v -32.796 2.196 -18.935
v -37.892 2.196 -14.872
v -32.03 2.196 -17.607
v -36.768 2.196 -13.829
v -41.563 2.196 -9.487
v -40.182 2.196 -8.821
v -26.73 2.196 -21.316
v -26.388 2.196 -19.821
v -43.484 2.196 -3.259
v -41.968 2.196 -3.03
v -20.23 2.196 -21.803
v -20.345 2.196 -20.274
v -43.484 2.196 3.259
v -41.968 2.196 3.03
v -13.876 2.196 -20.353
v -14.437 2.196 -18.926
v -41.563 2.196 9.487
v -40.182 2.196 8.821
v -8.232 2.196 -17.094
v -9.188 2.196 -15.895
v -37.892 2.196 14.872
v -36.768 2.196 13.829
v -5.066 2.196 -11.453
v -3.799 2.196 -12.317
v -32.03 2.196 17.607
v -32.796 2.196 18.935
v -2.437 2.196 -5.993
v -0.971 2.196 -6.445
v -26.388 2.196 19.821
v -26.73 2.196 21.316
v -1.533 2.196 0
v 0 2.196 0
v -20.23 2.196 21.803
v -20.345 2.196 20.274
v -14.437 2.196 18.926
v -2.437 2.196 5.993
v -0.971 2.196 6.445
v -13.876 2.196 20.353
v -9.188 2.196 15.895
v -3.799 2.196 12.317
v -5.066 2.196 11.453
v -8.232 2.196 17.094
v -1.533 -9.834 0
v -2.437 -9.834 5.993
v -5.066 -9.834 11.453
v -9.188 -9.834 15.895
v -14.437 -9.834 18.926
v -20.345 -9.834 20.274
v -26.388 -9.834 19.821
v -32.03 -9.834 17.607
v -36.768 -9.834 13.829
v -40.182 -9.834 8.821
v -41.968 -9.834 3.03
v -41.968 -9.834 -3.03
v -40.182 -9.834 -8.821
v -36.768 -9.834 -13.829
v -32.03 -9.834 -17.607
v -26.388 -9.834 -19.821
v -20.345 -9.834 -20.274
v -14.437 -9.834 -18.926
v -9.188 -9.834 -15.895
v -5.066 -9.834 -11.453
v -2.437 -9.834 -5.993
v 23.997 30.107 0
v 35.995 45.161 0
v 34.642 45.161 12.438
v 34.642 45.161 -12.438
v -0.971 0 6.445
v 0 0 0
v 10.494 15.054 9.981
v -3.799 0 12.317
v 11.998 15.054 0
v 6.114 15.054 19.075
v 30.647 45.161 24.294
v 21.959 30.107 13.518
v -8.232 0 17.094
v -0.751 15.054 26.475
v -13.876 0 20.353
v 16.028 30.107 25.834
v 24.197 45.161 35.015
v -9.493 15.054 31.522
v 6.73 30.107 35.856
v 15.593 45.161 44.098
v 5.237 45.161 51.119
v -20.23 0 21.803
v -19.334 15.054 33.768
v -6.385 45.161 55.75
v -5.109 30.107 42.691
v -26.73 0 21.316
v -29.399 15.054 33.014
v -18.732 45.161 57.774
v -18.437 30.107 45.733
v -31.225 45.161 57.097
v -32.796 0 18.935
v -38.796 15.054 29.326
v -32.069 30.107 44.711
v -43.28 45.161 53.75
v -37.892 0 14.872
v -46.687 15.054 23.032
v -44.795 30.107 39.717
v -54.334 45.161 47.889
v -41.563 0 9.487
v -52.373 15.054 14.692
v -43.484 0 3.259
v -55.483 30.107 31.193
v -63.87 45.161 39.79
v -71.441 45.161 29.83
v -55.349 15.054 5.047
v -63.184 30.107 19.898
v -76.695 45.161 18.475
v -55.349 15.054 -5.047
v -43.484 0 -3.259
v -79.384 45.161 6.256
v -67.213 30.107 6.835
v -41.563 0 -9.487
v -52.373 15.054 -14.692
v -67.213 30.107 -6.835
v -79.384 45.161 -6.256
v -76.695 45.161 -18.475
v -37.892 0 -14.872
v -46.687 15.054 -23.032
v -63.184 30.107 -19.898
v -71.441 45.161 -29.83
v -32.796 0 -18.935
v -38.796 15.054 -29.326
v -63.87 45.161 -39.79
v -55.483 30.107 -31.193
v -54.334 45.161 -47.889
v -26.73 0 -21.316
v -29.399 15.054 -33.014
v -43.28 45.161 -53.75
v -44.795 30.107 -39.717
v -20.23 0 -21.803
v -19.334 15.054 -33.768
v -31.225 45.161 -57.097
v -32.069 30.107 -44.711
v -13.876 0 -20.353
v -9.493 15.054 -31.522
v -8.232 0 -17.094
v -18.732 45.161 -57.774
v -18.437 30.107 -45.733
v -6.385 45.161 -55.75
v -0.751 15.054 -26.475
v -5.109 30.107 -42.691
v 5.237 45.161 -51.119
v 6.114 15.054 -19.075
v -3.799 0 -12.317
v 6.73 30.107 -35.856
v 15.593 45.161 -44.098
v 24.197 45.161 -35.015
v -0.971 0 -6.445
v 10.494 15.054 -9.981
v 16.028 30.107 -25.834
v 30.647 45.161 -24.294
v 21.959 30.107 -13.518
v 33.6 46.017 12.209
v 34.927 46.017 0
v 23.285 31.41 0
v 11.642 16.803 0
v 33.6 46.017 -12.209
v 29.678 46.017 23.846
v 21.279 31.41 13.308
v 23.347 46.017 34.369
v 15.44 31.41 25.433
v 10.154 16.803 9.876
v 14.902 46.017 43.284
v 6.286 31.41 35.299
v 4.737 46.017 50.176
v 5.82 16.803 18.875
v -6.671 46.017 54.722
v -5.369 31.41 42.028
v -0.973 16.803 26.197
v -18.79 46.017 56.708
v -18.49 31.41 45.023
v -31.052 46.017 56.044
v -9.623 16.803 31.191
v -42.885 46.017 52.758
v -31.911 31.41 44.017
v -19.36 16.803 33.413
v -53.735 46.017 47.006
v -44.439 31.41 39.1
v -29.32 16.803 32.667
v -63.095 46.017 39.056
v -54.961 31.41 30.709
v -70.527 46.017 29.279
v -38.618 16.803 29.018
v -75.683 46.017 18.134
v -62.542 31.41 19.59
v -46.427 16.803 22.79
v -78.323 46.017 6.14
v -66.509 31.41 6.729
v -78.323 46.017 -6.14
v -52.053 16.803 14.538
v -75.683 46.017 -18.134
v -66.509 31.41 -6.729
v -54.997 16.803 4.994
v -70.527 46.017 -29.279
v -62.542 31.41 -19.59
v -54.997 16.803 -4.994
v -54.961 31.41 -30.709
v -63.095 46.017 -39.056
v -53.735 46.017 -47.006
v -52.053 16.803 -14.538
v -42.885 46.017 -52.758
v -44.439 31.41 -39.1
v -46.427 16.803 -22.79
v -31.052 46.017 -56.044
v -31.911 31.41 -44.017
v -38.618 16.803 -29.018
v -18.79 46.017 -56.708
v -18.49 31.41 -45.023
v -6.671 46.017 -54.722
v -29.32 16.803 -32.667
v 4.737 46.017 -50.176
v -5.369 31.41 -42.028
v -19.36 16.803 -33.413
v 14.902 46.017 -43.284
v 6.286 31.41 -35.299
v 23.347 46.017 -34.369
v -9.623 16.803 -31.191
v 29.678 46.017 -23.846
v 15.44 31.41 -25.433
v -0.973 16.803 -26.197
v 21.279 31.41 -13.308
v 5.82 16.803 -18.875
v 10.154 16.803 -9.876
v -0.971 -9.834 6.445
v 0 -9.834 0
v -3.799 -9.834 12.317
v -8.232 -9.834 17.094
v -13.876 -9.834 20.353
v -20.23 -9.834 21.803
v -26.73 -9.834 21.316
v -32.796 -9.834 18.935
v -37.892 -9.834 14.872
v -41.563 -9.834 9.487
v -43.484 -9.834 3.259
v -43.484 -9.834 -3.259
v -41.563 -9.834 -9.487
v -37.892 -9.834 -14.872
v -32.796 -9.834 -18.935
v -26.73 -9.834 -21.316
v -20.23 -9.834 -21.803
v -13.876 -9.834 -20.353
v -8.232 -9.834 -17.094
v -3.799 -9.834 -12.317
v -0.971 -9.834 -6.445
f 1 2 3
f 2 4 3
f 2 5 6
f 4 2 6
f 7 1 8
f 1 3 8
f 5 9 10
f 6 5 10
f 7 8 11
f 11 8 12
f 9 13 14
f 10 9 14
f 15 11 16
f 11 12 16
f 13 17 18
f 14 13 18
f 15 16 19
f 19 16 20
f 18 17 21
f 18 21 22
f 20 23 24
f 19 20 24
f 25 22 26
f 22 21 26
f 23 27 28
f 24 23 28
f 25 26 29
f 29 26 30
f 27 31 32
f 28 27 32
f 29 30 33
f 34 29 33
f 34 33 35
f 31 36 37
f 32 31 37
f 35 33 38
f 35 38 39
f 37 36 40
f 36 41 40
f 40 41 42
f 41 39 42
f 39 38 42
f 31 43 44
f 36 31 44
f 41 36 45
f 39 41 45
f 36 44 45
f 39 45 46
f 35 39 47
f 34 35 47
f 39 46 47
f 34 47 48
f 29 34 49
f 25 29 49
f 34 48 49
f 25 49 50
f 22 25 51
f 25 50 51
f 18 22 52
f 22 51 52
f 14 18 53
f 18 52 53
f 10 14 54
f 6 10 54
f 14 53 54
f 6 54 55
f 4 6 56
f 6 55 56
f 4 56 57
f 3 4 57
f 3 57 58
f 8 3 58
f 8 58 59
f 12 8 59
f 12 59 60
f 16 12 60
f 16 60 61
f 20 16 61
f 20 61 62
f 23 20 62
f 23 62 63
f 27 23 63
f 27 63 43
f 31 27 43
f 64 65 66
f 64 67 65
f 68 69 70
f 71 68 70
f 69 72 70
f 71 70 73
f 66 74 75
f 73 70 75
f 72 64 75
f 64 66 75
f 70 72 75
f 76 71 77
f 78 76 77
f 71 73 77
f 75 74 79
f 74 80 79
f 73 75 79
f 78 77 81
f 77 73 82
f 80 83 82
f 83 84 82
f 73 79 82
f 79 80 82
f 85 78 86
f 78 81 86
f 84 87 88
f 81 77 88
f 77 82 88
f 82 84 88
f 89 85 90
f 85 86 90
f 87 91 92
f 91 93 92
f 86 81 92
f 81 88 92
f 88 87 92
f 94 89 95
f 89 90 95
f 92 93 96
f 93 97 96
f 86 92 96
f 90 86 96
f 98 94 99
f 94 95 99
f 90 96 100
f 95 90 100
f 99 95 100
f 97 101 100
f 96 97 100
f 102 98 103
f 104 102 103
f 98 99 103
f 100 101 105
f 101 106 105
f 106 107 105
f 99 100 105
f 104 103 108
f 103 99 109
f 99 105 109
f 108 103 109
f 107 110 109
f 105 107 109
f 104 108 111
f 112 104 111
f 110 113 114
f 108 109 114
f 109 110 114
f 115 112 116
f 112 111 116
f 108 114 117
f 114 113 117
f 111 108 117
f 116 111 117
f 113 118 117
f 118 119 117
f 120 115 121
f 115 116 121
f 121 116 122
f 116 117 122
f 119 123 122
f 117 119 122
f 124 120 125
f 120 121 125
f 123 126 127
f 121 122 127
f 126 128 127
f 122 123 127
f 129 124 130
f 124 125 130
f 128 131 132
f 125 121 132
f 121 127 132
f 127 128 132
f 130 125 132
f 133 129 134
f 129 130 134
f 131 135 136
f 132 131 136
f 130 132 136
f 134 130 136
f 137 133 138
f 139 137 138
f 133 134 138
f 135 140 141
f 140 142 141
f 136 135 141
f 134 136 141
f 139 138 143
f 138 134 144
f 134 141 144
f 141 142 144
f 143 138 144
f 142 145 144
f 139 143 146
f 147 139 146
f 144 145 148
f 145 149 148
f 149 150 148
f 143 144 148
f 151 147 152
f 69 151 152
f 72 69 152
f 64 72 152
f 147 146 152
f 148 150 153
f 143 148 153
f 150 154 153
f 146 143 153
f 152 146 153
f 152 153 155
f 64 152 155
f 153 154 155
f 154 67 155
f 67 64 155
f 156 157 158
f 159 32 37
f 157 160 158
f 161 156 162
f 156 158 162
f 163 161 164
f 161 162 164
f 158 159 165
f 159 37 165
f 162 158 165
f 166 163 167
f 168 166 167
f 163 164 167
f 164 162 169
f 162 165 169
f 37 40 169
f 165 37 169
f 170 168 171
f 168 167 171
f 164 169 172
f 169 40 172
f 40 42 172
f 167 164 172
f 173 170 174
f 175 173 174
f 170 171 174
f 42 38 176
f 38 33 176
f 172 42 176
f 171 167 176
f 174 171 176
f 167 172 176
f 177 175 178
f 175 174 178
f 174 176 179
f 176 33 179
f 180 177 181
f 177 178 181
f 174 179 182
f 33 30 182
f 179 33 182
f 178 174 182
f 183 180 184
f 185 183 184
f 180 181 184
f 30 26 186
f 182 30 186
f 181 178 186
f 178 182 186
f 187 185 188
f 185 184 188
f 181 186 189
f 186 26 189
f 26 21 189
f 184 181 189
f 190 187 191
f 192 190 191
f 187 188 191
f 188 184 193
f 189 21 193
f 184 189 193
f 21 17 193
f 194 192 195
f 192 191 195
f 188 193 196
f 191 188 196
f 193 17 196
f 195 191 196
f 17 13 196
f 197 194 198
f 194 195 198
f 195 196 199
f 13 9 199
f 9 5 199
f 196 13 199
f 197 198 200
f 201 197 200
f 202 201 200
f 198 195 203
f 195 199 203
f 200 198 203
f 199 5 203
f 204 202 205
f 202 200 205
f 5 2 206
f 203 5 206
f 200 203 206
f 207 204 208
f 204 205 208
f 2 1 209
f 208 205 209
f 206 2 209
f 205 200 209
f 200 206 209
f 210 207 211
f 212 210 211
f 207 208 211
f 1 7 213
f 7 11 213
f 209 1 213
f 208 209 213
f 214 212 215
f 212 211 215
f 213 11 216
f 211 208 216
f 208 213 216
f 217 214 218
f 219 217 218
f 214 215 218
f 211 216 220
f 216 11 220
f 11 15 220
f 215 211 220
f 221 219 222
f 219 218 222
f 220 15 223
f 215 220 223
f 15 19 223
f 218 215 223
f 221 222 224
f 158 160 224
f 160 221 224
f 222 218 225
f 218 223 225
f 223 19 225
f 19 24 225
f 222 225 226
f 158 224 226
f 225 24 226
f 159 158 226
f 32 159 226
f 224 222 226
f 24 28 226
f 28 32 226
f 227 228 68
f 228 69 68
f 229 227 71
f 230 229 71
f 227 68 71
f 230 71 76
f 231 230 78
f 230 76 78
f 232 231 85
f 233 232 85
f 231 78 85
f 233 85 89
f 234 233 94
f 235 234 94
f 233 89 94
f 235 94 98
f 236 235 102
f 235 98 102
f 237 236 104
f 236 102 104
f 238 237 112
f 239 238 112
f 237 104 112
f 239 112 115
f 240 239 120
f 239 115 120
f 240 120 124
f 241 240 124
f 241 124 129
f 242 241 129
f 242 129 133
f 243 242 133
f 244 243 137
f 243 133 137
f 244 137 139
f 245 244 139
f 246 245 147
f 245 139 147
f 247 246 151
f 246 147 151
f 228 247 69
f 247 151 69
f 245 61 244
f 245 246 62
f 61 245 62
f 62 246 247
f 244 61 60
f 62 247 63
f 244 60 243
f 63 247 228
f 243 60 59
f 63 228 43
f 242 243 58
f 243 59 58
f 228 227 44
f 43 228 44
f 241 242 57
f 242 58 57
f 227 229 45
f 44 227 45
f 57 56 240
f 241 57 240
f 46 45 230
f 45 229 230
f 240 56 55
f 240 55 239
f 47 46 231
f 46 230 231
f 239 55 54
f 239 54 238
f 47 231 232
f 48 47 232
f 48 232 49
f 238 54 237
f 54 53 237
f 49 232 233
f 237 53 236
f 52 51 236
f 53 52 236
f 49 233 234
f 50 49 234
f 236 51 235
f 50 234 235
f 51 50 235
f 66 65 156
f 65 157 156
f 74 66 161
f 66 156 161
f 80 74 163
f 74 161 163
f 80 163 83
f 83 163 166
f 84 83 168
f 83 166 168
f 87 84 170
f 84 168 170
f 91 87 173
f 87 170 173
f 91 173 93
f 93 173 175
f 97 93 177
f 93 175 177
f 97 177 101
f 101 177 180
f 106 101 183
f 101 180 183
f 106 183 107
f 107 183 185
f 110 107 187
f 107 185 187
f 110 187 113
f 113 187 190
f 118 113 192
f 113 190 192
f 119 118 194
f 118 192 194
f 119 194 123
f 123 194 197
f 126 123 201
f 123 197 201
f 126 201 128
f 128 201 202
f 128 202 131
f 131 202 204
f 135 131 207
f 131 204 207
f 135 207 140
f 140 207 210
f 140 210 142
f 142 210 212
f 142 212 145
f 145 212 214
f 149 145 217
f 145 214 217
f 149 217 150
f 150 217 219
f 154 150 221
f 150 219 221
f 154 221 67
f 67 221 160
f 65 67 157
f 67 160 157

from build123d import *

# Parameters (mm, degrees)
F2_R     = 20.330932
F3_DEPTH = 76.2


with BuildPart() as f1:
    # F0 (on Top) → F1 (revolve)
    with BuildSketch(Plane.XY):
        Polygon((34.927377, 46.017325), (0, 2.195979), (-21.864308, 2.195979), (-21.864308, -9.834165), (0, -9.834165), (0, 0), (35.994954, 45.160774), align=None)
    revolve(axis=Axis((-21.864308, -3.819093, 0), (0, -1, 0)))

    # F2 (on face) → F3 (cut)
    with BuildSketch(Plane.XZ.offset(9.834165)):
        with Locations((-21.864308, 0)):
            Circle(F2_R)
    extrude(amount=-F3_DEPTH, mode=Mode.SUBTRACT)


solid = f1.part
